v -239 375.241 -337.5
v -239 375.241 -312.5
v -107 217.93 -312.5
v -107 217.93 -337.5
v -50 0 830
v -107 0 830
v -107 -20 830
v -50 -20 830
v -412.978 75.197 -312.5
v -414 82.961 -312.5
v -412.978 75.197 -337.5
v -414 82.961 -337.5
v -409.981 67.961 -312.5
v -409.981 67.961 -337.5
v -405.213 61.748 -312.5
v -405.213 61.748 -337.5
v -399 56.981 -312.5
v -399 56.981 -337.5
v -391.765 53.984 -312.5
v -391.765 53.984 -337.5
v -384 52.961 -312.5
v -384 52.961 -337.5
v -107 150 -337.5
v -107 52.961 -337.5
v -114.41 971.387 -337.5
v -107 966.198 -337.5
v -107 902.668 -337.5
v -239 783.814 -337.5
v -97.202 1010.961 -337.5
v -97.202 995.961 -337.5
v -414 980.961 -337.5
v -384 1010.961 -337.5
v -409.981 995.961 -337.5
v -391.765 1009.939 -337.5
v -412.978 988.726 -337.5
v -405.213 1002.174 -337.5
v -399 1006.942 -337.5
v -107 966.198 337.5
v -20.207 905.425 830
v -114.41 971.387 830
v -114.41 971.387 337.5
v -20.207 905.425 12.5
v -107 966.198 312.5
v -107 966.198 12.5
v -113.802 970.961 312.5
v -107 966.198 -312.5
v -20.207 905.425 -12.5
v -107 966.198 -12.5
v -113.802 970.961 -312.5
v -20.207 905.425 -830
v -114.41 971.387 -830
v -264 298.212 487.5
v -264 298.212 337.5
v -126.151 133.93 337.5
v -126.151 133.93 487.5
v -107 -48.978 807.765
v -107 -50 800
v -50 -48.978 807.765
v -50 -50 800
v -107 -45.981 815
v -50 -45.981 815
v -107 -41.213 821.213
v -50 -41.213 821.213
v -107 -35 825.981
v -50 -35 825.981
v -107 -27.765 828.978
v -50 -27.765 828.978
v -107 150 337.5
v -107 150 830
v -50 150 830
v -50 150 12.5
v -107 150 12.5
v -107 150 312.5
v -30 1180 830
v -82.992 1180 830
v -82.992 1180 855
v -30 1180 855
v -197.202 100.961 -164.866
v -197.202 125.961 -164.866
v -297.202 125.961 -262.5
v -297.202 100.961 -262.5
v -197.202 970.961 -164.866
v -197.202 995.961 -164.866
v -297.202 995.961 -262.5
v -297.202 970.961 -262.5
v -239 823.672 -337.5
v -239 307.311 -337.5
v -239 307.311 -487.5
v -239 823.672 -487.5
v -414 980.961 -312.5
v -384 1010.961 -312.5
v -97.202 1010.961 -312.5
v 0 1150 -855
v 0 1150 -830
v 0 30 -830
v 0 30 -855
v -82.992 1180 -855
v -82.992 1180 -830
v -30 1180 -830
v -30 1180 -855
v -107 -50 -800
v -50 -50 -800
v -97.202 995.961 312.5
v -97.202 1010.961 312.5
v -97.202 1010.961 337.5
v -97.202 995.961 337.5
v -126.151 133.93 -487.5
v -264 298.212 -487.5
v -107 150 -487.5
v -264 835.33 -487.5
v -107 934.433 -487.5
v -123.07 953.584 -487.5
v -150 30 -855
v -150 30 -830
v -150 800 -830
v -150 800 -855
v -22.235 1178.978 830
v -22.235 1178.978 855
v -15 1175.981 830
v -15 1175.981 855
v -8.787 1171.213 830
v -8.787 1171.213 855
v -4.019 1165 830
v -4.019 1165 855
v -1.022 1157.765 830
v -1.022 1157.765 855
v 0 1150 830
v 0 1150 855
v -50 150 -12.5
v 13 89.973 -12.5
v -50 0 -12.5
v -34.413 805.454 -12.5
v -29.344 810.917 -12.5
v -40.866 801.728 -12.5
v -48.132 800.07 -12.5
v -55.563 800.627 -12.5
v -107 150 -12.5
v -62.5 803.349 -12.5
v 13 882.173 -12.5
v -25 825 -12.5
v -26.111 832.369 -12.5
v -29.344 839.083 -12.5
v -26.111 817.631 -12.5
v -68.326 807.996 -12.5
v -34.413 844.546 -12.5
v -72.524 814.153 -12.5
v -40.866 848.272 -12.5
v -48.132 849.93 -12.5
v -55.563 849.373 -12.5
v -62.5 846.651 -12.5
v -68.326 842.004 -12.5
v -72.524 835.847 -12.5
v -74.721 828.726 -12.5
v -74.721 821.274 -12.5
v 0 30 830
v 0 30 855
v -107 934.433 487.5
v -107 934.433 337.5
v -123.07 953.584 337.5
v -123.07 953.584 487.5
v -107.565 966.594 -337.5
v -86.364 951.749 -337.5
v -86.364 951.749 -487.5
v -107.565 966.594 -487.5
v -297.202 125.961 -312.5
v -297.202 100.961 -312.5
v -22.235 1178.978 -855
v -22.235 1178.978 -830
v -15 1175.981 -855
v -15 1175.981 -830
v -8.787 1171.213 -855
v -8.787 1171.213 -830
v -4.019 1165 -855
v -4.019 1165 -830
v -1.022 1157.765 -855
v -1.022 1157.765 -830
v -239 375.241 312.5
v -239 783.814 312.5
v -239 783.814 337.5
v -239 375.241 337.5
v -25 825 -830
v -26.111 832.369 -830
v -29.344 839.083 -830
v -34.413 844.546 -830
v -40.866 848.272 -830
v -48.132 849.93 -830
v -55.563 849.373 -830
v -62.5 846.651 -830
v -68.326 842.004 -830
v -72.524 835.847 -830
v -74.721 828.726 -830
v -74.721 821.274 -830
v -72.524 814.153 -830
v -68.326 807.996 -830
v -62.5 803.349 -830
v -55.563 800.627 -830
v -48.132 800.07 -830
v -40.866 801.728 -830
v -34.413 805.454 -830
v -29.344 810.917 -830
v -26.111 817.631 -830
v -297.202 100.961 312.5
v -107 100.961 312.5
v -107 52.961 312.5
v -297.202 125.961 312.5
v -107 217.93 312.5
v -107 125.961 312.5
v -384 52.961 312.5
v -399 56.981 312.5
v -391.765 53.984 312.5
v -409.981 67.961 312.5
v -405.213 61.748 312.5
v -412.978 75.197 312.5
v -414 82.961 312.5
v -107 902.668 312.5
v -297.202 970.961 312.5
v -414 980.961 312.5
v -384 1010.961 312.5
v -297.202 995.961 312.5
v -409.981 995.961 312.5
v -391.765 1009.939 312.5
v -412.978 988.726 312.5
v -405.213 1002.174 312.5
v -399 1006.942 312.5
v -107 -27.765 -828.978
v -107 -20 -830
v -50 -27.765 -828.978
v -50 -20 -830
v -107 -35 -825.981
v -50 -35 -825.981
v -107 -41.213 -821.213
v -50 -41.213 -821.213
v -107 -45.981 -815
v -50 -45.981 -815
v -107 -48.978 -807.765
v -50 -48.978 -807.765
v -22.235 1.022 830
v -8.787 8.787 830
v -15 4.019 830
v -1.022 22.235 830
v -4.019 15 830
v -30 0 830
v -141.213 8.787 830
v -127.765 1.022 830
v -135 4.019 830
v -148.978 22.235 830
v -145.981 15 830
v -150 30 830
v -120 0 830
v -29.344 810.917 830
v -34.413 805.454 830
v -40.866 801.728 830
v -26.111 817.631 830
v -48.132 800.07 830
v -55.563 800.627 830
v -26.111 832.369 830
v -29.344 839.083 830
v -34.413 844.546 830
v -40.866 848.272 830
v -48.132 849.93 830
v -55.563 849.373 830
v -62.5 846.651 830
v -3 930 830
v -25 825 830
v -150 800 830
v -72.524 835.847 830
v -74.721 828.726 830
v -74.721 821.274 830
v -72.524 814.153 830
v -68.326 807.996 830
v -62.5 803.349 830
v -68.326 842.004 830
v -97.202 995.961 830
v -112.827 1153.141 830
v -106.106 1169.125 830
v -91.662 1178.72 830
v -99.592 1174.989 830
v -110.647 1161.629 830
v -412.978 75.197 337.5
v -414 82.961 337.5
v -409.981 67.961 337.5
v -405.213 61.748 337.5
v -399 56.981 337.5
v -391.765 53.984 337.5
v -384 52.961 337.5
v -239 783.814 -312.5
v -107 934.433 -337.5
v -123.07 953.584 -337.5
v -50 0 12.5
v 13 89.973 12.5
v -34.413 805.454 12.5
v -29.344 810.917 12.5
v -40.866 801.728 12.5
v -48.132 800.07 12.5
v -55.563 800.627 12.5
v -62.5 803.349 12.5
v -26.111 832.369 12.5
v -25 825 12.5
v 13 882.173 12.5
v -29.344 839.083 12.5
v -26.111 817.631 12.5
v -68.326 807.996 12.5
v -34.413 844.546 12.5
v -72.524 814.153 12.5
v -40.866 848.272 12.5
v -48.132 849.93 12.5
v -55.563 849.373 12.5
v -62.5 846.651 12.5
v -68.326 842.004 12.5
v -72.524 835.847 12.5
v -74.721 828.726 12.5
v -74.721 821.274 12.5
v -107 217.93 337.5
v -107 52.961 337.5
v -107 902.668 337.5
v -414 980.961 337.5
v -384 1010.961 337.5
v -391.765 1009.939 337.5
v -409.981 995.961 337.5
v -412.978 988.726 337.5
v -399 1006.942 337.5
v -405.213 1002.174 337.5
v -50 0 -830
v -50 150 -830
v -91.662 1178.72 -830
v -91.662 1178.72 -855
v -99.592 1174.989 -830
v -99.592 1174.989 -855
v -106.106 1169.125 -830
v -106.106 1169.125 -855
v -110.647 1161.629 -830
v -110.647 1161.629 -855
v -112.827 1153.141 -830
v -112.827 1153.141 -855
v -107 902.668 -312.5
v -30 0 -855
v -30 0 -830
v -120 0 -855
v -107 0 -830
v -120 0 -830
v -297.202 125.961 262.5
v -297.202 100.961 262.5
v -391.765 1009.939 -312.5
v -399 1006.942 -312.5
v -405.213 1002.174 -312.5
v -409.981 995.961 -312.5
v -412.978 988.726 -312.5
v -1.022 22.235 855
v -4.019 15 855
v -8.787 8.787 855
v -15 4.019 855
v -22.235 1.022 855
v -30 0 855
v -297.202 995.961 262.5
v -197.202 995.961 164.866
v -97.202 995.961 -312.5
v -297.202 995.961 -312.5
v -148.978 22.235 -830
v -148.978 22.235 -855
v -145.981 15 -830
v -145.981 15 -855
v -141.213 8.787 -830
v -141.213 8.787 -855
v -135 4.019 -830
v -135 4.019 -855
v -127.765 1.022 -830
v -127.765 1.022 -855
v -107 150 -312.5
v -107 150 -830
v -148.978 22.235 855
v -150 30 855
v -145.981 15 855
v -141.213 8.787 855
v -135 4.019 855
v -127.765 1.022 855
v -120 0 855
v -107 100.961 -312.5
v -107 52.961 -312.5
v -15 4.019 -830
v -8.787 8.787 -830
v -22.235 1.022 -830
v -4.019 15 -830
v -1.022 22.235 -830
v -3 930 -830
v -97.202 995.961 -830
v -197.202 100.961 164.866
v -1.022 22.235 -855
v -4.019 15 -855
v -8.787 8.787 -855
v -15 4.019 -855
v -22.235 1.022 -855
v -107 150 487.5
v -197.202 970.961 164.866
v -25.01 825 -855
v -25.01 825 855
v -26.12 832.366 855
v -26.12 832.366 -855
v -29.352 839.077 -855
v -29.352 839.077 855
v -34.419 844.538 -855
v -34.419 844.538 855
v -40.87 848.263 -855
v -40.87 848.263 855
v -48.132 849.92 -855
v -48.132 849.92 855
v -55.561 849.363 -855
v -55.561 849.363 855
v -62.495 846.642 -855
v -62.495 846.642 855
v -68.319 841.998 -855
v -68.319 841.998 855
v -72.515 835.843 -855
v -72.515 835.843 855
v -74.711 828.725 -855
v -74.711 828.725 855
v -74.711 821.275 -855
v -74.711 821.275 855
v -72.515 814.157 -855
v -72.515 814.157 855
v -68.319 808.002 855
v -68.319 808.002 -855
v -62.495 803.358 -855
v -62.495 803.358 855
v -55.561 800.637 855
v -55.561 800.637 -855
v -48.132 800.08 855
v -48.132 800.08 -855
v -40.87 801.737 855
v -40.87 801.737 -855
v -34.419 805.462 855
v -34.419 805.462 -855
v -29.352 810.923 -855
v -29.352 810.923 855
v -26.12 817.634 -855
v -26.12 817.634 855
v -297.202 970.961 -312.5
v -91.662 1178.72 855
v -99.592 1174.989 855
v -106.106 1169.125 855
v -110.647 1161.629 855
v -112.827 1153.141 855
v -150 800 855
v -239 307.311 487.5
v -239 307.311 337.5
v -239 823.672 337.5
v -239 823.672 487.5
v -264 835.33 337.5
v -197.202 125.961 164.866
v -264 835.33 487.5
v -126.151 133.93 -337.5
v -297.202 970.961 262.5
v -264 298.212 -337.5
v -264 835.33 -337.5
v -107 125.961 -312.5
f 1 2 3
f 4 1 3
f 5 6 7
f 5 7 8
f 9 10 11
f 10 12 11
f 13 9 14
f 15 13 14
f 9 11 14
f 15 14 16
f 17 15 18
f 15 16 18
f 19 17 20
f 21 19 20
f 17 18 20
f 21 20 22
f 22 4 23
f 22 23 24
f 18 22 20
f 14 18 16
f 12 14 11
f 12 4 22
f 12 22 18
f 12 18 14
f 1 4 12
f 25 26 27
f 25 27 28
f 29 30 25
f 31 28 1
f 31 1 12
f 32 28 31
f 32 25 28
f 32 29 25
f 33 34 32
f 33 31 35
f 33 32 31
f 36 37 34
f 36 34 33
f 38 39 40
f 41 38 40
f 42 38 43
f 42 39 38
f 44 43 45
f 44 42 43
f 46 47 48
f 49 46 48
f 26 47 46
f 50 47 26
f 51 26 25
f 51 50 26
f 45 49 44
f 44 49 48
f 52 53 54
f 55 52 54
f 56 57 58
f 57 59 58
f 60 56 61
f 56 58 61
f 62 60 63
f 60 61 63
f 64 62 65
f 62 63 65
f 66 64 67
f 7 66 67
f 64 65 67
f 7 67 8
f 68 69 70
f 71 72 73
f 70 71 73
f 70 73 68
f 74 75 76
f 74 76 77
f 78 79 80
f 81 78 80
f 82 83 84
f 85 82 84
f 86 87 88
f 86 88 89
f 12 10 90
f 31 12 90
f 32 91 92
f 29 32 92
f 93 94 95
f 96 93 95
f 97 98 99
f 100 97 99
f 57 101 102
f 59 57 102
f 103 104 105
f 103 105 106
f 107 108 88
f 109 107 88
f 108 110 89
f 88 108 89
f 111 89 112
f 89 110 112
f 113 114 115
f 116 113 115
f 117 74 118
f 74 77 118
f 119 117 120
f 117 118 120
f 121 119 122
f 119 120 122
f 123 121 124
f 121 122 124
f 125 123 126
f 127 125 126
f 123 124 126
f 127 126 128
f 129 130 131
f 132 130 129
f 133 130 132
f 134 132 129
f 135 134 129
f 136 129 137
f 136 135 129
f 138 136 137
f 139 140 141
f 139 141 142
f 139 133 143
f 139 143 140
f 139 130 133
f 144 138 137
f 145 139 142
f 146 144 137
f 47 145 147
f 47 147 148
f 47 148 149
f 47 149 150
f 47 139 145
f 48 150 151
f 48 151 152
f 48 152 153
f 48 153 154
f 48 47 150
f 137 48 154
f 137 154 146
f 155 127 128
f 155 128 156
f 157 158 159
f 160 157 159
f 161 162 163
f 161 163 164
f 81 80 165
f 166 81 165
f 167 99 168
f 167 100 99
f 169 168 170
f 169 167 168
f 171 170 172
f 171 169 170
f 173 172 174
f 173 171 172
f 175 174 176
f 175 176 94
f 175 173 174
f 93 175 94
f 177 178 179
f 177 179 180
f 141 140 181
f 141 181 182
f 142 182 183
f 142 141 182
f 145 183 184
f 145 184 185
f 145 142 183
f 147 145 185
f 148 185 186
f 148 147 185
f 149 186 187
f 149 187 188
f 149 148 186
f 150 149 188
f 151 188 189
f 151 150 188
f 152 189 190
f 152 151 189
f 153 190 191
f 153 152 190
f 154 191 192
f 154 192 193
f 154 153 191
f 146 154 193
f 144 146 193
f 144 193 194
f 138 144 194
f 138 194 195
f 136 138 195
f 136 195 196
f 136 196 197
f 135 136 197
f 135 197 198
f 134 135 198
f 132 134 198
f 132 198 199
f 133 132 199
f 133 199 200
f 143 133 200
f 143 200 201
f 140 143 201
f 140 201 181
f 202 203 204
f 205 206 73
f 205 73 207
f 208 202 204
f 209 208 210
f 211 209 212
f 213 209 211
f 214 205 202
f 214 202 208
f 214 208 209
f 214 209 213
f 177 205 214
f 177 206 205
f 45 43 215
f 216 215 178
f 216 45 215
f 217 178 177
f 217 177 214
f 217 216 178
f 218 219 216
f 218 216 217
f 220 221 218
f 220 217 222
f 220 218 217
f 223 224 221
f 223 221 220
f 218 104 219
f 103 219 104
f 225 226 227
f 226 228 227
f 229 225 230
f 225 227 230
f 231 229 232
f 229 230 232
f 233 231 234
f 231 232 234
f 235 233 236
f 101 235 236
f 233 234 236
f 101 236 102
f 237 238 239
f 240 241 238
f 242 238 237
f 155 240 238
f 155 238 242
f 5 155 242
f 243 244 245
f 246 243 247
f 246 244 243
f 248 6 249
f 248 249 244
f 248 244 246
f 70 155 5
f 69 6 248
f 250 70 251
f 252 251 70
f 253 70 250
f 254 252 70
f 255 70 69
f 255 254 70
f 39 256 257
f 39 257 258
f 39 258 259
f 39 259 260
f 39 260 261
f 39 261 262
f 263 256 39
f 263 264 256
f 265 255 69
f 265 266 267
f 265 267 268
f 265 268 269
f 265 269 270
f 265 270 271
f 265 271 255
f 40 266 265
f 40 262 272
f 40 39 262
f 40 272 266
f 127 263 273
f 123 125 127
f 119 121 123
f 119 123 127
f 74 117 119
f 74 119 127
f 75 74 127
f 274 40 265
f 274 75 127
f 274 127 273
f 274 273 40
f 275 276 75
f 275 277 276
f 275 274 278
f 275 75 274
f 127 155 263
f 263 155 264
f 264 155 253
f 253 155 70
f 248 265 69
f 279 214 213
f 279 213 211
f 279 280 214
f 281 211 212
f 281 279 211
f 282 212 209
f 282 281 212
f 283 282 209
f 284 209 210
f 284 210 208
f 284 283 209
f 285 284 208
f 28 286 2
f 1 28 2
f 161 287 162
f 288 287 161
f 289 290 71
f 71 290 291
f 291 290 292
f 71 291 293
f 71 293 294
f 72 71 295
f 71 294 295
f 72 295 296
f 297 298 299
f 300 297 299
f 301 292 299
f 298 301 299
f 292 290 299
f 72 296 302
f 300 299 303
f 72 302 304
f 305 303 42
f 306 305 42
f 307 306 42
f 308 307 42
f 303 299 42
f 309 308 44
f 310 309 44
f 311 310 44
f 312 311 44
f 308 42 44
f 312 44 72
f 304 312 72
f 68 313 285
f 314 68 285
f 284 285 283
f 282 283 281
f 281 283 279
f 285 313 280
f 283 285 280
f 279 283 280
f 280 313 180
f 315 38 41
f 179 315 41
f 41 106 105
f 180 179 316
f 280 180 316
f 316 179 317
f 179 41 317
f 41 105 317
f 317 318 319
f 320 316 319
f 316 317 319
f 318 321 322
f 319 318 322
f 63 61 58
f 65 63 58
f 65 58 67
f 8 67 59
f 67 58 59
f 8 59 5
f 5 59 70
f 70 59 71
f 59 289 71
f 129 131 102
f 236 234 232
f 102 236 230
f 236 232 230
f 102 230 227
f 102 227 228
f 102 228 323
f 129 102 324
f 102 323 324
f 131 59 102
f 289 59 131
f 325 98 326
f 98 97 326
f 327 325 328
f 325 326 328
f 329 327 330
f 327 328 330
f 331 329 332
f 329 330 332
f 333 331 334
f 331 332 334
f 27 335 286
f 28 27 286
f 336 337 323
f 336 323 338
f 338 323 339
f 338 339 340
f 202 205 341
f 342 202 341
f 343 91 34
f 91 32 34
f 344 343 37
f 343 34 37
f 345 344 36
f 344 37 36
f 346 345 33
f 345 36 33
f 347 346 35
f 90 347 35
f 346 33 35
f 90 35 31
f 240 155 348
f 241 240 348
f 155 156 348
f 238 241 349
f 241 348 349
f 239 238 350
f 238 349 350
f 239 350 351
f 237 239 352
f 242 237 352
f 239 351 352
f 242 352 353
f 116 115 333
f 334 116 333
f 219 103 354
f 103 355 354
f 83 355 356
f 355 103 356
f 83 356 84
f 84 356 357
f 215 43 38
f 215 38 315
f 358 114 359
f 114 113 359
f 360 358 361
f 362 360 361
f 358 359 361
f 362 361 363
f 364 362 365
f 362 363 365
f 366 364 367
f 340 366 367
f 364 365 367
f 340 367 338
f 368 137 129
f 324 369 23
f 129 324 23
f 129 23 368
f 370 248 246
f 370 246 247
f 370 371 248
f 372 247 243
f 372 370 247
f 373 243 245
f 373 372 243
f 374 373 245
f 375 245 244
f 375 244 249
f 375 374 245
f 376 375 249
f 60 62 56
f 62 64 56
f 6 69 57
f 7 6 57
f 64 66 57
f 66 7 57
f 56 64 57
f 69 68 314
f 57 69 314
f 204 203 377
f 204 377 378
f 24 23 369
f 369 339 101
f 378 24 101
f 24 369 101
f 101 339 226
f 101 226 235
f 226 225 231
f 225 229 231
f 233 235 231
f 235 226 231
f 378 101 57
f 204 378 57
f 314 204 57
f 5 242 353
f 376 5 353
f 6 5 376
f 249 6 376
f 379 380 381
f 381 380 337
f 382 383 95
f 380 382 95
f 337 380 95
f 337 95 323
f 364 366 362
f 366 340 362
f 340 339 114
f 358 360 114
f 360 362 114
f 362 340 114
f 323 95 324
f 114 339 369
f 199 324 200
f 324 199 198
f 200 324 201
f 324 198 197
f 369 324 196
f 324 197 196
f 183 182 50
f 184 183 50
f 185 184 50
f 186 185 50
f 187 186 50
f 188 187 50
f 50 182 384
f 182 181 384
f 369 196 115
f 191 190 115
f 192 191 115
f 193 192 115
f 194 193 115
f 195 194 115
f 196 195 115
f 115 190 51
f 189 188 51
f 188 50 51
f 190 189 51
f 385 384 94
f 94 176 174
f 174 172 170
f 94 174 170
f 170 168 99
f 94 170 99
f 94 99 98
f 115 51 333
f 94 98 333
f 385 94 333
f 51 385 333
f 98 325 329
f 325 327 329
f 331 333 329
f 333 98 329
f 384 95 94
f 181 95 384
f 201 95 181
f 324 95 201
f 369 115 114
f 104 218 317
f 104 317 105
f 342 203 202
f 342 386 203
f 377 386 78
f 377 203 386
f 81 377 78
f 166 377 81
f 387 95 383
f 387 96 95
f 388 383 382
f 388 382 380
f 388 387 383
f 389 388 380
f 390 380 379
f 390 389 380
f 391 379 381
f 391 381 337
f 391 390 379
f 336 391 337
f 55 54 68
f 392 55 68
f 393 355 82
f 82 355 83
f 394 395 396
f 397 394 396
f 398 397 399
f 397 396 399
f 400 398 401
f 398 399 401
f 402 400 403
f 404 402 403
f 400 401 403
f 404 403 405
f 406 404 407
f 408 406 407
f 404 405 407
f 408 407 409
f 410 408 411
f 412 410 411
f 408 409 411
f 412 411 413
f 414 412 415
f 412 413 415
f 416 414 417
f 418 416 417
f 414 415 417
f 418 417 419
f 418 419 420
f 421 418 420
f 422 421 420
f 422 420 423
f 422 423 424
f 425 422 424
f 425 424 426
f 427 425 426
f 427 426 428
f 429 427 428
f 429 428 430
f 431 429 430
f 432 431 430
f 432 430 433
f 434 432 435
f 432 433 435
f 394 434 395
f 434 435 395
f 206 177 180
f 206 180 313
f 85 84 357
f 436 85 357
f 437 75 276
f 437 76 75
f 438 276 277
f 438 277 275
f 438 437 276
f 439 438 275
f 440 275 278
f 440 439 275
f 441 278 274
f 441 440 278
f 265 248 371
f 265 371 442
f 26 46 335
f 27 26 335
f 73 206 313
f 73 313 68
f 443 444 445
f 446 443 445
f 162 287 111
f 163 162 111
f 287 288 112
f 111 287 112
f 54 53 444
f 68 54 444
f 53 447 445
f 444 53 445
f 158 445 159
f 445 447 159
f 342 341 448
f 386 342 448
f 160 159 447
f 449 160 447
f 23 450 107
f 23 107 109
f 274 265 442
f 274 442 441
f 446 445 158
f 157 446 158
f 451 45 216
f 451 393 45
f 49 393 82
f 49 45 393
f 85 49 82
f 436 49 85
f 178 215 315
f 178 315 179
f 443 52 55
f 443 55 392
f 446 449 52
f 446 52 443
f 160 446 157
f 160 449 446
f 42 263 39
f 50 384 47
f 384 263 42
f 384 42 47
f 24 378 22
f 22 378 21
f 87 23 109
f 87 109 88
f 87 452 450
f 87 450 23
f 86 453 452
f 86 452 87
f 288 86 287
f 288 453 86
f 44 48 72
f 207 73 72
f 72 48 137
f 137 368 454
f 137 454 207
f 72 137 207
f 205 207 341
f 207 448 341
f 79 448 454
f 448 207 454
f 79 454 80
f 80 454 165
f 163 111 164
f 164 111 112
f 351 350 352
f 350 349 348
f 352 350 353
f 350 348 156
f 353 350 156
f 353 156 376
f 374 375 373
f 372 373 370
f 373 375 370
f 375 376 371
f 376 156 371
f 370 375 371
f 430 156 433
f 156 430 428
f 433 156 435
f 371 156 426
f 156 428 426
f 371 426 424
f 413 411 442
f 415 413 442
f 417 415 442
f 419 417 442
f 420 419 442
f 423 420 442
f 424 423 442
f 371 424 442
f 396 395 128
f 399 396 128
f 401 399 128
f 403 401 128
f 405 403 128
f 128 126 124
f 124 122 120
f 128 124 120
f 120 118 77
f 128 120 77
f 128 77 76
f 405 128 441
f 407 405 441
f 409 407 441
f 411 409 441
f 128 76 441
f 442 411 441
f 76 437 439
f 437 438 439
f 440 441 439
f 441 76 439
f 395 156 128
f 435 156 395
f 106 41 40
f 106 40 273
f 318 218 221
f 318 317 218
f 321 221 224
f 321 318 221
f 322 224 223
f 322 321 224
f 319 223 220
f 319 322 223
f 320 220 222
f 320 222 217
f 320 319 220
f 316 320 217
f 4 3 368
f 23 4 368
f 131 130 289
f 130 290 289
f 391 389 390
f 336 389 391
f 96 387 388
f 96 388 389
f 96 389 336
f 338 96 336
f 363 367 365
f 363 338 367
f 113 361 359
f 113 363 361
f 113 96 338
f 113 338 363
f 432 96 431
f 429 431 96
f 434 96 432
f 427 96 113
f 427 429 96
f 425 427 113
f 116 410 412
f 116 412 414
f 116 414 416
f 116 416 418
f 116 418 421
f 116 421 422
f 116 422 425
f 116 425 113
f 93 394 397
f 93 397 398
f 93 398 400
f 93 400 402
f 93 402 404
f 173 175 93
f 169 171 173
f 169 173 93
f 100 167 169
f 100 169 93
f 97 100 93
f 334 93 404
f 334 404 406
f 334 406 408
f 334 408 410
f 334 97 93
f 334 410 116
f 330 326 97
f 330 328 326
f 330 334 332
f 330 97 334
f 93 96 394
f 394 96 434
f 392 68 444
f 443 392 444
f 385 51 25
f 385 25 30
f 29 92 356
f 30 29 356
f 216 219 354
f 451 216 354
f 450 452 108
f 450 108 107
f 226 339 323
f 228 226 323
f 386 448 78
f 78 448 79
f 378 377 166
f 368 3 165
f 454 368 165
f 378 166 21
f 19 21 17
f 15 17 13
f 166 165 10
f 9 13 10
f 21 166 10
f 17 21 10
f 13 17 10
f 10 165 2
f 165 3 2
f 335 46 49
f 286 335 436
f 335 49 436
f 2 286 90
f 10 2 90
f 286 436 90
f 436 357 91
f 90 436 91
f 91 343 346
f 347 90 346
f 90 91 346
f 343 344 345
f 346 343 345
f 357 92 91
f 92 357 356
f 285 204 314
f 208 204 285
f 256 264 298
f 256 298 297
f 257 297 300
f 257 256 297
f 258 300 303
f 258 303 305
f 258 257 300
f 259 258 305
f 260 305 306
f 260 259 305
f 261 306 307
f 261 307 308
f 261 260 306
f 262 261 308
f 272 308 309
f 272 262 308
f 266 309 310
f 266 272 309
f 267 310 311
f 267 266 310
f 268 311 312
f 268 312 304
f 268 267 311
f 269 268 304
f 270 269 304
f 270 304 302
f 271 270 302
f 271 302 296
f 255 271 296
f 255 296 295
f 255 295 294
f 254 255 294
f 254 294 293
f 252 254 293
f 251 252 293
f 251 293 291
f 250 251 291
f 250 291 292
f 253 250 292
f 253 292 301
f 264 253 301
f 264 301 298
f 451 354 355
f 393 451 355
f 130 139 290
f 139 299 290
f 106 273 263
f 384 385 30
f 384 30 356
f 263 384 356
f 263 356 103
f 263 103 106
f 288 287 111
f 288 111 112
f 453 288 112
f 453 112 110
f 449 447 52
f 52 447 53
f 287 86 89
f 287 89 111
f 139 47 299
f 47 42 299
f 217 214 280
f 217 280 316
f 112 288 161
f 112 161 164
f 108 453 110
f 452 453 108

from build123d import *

# Parameters (mm, degrees)
BOSS_EXTRUDE1_START = 830
BOSS_EXTRUDE1_DEPTH = 25
BOSS_EXTRUDE2_START = -830
BOSS_EXTRUDE2_DEPTH = 25
SKETCH2_W           = 57
SKETCH2_H           = 150
SKETCH2_H_2         = 50
BOSS_EXTRUDE3_DEPTH = 1660
BOSS_EXTRUDE4_DEPTH = 12.5
SKETCH4_R           = 25
CUT_EXTRUDE1_DEPTH  = 2084.026644093
SKETCH5_R           = 25
SKETCH5_R_2         = 24.99
BOSS_EXTRUDE5_DEPTH = 1710
BOSS_EXTRUDE6_START = 300
BOSS_EXTRUDE6_DEPTH = 25
EXTRUDE_THIN2_DEPTH = 150
BOSS_EXTRUDE8_REACH = 1453.211
SKETCH8_W           = 150
SKETCH8_H           = 25
BOSS_EXTRUDE9_DEPTH = 25
LPATTERN1_COUNT     = 2
LPATTERN1_PITCH     = 870
FILLET1_R           = 30


with BuildPart() as part:
    # Sketch1 → Boss-Extrude1 (new body)
    with BuildSketch(Plane.XY.offset(BOSS_EXTRUDE1_START)):
        Polygon((0, 1180), (0, 0), (-150, 0), (-150, 800), (-110, 1180), align=None)
    extrude(amount=BOSS_EXTRUDE1_DEPTH)



with BuildPart() as body_2:
    # Sketch1<2> → Boss-Extrude2 (new body)
    with BuildSketch(Plane.XY.offset(BOSS_EXTRUDE2_START)):
        Polygon((0, 1180), (0, 0), (-150, 0), (-150, 800), (-110, 1180), align=None)
    extrude(amount=-BOSS_EXTRUDE2_DEPTH)


with BuildPart() as part_1:
    add(part.part)

    add(body_2.part)  # Boss-Extrude3 merges body 2
    # Sketch2 → Boss-Extrude3 (add)
    with BuildSketch(Plane.XY.offset(-830)):
        Polygon((-20.207293091, 905.425438671), (-114.409778184, 971.386728852), (-97.202485093, 995.96129018), (-3, 930), align=None)
        with Locations((-78.5, 75)):
            Rectangle(SKETCH2_W, SKETCH2_H)
        with Locations((-78.5, -25)):
            Rectangle(SKETCH2_W, SKETCH2_H_2)
    extrude(amount=BOSS_EXTRUDE3_DEPTH)

    # Sketch3 → Boss-Extrude4 (add, symmetric)
    with BuildSketch(Plane.XY):
        Polygon((-107, 150), (-107, 966.198346311), (-20.207293091, 905.425438671), (13, 882.173441726), (13, 89.973324425), (-50, 0), (-50, 150), align=None)
    extrude(amount=BOSS_EXTRUDE4_DEPTH, both=True)

    # Sketch4 → Cut-Extrude1 (cut, through all)
    with BuildSketch(Plane.XY.offset(855)):
        with Locations((-50, 825)):
            Circle(SKETCH4_R)
    extrude(amount=-CUT_EXTRUDE1_DEPTH, mode=Mode.SUBTRACT)

    # Sketch5 → Boss-Extrude5 (add)
    with BuildSketch(Plane.XY.offset(855)):
        with Locations((-50, 825)):
            Circle(SKETCH5_R)
        with Locations((-50, 825)):
            Circle(SKETCH5_R_2, mode=Mode.SUBTRACT)
    extrude(amount=-BOSS_EXTRUDE5_DEPTH)

    # Sketch6 → Boss-Extrude6 (add)
    with BuildSketch(Plane(origin=(0, 0, -12.5), x_dir=(-1, 0, 0), z_dir=(0, 0, -1)).offset(BOSS_EXTRUDE6_START)):
        Polygon((107, 217.929954778), (107, 150), (107, 52.96129018), (414, 52.96129018), (414, 1010.96129018), (97.202485093, 1010.96129018), (97.202485093, 995.96129018), (114.409778184, 971.386728852), (107, 966.198346311), (107, 902.667728725), (239, 783.814394878), (239, 375.241429), align=None)
    extrude(amount=BOSS_EXTRUDE6_DEPTH)


with BuildPart() as body_2_2:
    # Sketch7 → Extrude-Thin2 (new body)
    with BuildSketch(Plane(origin=(0, 0, -337.5), x_dir=(-1, 0, 0), z_dir=(0, 0, -1))):
        Polygon((107, 150), (239, 307.311474222), (239, 823.671886203), (107, 934.433037518), (123.069690242, 953.584148596), (264, 835.329577657), (264, 298.212218366), (126.151111078, 133.930309758), align=None)
    extrude(amount=EXTRUDE_THIN2_DEPTH)


with BuildPart() as body_3:
    # Boss-Extrude8: up to this plane
    boss_extrude8_end = Plane(origin=(418.76280579, 598.055266387, 1037.963939182), z_dir=(-0.5735764363510432, -0.8191520442889939, 0))
    # Sketch8 → Boss-Extrude8 (new, up to the surface)
    with BuildSketch(Plane(origin=(397.328272504, 333.398006914, 0), x_dir=(0, 0, -1), z_dir=(0.7660444431189801, 0.6427876096865369, 0)), mode=Mode.PRIVATE) as boss_extrude8_sk1:
        with Locations((412.5, 797.095510094)):
            Rectangle(SKETCH8_W, SKETCH8_H)
    boss_extrude8_tool1 = split(extrude(boss_extrude8_sk1.sketch, amount=BOSS_EXTRUDE8_REACH, mode=Mode.PRIVATE), bisect_by=boss_extrude8_end, keep=Keep.BOTH, mode=Mode.PRIVATE)
    add(boss_extrude8_tool1.solids().sort_by_distance((-115.034845, 944.008593, -412.5))[0])


with BuildPart() as body_4:
    # Mirror2: mirrored copy
    add(body_2_2.part.mirror(Plane.XY))


with BuildPart() as body_5:
    # Mirror2 2: mirrored copy
    add(part_1.part.mirror(Plane.XY))


with BuildPart() as part_2:
    add(part_1.part)

    add(body_5.part)  # Boss-Extrude9 merges body 5
    # Sketch9 → Boss-Extrude9 (add)
    with BuildSketch(Plane(origin=(0, 995.96129018, 0), x_dir=(1, 0, 0), z_dir=(0, 1, 0))):
        Polygon((-297.202485093, 312.5), (-97.202485093, 312.5), (-97.202485093, -312.5), (-297.202485093, -312.5), (-297.202485093, -262.5), (-197.202485093, -164.866379419), (-197.202485093, 164.866379419), (-297.202485093, 262.5), align=None)
    boss_extrude9 = extrude(amount=-BOSS_EXTRUDE9_DEPTH)

    # LPattern1: Boss-Extrude9 ×2
    with Locations(*[(0, -i * LPATTERN1_PITCH, 0) for i in range(1, LPATTERN1_COUNT)]):
        add(boss_extrude9)

    # Fillet1
    fillet1_edges = [part_2.edges().sort_by_distance(p)[0] for p in [
        (-414, 52.96129018, -325),
        (-414, 1010.96129018, -325),
        (-414, 52.96129018, 325),
        (-414, 1010.96129018, 325),
        (-110, 1180, -842.5),
        (0, 1180, -842.5),
        (0, 0, -842.5),
        (-150, 0, -842.5),
        (-78.5, -50, 830),
        (-78.5, -50, -830),
        (0, 1180, 842.5),
        (0, 0, 842.5),
        (-150, 0, 842.5),
        (-110, 1180, 842.5),
    ]]
    fillet(fillet1_edges, radius=FILLET1_R)


solid = Compound([body_2_2.part, body_3.part, body_4.part, part_2.part])
